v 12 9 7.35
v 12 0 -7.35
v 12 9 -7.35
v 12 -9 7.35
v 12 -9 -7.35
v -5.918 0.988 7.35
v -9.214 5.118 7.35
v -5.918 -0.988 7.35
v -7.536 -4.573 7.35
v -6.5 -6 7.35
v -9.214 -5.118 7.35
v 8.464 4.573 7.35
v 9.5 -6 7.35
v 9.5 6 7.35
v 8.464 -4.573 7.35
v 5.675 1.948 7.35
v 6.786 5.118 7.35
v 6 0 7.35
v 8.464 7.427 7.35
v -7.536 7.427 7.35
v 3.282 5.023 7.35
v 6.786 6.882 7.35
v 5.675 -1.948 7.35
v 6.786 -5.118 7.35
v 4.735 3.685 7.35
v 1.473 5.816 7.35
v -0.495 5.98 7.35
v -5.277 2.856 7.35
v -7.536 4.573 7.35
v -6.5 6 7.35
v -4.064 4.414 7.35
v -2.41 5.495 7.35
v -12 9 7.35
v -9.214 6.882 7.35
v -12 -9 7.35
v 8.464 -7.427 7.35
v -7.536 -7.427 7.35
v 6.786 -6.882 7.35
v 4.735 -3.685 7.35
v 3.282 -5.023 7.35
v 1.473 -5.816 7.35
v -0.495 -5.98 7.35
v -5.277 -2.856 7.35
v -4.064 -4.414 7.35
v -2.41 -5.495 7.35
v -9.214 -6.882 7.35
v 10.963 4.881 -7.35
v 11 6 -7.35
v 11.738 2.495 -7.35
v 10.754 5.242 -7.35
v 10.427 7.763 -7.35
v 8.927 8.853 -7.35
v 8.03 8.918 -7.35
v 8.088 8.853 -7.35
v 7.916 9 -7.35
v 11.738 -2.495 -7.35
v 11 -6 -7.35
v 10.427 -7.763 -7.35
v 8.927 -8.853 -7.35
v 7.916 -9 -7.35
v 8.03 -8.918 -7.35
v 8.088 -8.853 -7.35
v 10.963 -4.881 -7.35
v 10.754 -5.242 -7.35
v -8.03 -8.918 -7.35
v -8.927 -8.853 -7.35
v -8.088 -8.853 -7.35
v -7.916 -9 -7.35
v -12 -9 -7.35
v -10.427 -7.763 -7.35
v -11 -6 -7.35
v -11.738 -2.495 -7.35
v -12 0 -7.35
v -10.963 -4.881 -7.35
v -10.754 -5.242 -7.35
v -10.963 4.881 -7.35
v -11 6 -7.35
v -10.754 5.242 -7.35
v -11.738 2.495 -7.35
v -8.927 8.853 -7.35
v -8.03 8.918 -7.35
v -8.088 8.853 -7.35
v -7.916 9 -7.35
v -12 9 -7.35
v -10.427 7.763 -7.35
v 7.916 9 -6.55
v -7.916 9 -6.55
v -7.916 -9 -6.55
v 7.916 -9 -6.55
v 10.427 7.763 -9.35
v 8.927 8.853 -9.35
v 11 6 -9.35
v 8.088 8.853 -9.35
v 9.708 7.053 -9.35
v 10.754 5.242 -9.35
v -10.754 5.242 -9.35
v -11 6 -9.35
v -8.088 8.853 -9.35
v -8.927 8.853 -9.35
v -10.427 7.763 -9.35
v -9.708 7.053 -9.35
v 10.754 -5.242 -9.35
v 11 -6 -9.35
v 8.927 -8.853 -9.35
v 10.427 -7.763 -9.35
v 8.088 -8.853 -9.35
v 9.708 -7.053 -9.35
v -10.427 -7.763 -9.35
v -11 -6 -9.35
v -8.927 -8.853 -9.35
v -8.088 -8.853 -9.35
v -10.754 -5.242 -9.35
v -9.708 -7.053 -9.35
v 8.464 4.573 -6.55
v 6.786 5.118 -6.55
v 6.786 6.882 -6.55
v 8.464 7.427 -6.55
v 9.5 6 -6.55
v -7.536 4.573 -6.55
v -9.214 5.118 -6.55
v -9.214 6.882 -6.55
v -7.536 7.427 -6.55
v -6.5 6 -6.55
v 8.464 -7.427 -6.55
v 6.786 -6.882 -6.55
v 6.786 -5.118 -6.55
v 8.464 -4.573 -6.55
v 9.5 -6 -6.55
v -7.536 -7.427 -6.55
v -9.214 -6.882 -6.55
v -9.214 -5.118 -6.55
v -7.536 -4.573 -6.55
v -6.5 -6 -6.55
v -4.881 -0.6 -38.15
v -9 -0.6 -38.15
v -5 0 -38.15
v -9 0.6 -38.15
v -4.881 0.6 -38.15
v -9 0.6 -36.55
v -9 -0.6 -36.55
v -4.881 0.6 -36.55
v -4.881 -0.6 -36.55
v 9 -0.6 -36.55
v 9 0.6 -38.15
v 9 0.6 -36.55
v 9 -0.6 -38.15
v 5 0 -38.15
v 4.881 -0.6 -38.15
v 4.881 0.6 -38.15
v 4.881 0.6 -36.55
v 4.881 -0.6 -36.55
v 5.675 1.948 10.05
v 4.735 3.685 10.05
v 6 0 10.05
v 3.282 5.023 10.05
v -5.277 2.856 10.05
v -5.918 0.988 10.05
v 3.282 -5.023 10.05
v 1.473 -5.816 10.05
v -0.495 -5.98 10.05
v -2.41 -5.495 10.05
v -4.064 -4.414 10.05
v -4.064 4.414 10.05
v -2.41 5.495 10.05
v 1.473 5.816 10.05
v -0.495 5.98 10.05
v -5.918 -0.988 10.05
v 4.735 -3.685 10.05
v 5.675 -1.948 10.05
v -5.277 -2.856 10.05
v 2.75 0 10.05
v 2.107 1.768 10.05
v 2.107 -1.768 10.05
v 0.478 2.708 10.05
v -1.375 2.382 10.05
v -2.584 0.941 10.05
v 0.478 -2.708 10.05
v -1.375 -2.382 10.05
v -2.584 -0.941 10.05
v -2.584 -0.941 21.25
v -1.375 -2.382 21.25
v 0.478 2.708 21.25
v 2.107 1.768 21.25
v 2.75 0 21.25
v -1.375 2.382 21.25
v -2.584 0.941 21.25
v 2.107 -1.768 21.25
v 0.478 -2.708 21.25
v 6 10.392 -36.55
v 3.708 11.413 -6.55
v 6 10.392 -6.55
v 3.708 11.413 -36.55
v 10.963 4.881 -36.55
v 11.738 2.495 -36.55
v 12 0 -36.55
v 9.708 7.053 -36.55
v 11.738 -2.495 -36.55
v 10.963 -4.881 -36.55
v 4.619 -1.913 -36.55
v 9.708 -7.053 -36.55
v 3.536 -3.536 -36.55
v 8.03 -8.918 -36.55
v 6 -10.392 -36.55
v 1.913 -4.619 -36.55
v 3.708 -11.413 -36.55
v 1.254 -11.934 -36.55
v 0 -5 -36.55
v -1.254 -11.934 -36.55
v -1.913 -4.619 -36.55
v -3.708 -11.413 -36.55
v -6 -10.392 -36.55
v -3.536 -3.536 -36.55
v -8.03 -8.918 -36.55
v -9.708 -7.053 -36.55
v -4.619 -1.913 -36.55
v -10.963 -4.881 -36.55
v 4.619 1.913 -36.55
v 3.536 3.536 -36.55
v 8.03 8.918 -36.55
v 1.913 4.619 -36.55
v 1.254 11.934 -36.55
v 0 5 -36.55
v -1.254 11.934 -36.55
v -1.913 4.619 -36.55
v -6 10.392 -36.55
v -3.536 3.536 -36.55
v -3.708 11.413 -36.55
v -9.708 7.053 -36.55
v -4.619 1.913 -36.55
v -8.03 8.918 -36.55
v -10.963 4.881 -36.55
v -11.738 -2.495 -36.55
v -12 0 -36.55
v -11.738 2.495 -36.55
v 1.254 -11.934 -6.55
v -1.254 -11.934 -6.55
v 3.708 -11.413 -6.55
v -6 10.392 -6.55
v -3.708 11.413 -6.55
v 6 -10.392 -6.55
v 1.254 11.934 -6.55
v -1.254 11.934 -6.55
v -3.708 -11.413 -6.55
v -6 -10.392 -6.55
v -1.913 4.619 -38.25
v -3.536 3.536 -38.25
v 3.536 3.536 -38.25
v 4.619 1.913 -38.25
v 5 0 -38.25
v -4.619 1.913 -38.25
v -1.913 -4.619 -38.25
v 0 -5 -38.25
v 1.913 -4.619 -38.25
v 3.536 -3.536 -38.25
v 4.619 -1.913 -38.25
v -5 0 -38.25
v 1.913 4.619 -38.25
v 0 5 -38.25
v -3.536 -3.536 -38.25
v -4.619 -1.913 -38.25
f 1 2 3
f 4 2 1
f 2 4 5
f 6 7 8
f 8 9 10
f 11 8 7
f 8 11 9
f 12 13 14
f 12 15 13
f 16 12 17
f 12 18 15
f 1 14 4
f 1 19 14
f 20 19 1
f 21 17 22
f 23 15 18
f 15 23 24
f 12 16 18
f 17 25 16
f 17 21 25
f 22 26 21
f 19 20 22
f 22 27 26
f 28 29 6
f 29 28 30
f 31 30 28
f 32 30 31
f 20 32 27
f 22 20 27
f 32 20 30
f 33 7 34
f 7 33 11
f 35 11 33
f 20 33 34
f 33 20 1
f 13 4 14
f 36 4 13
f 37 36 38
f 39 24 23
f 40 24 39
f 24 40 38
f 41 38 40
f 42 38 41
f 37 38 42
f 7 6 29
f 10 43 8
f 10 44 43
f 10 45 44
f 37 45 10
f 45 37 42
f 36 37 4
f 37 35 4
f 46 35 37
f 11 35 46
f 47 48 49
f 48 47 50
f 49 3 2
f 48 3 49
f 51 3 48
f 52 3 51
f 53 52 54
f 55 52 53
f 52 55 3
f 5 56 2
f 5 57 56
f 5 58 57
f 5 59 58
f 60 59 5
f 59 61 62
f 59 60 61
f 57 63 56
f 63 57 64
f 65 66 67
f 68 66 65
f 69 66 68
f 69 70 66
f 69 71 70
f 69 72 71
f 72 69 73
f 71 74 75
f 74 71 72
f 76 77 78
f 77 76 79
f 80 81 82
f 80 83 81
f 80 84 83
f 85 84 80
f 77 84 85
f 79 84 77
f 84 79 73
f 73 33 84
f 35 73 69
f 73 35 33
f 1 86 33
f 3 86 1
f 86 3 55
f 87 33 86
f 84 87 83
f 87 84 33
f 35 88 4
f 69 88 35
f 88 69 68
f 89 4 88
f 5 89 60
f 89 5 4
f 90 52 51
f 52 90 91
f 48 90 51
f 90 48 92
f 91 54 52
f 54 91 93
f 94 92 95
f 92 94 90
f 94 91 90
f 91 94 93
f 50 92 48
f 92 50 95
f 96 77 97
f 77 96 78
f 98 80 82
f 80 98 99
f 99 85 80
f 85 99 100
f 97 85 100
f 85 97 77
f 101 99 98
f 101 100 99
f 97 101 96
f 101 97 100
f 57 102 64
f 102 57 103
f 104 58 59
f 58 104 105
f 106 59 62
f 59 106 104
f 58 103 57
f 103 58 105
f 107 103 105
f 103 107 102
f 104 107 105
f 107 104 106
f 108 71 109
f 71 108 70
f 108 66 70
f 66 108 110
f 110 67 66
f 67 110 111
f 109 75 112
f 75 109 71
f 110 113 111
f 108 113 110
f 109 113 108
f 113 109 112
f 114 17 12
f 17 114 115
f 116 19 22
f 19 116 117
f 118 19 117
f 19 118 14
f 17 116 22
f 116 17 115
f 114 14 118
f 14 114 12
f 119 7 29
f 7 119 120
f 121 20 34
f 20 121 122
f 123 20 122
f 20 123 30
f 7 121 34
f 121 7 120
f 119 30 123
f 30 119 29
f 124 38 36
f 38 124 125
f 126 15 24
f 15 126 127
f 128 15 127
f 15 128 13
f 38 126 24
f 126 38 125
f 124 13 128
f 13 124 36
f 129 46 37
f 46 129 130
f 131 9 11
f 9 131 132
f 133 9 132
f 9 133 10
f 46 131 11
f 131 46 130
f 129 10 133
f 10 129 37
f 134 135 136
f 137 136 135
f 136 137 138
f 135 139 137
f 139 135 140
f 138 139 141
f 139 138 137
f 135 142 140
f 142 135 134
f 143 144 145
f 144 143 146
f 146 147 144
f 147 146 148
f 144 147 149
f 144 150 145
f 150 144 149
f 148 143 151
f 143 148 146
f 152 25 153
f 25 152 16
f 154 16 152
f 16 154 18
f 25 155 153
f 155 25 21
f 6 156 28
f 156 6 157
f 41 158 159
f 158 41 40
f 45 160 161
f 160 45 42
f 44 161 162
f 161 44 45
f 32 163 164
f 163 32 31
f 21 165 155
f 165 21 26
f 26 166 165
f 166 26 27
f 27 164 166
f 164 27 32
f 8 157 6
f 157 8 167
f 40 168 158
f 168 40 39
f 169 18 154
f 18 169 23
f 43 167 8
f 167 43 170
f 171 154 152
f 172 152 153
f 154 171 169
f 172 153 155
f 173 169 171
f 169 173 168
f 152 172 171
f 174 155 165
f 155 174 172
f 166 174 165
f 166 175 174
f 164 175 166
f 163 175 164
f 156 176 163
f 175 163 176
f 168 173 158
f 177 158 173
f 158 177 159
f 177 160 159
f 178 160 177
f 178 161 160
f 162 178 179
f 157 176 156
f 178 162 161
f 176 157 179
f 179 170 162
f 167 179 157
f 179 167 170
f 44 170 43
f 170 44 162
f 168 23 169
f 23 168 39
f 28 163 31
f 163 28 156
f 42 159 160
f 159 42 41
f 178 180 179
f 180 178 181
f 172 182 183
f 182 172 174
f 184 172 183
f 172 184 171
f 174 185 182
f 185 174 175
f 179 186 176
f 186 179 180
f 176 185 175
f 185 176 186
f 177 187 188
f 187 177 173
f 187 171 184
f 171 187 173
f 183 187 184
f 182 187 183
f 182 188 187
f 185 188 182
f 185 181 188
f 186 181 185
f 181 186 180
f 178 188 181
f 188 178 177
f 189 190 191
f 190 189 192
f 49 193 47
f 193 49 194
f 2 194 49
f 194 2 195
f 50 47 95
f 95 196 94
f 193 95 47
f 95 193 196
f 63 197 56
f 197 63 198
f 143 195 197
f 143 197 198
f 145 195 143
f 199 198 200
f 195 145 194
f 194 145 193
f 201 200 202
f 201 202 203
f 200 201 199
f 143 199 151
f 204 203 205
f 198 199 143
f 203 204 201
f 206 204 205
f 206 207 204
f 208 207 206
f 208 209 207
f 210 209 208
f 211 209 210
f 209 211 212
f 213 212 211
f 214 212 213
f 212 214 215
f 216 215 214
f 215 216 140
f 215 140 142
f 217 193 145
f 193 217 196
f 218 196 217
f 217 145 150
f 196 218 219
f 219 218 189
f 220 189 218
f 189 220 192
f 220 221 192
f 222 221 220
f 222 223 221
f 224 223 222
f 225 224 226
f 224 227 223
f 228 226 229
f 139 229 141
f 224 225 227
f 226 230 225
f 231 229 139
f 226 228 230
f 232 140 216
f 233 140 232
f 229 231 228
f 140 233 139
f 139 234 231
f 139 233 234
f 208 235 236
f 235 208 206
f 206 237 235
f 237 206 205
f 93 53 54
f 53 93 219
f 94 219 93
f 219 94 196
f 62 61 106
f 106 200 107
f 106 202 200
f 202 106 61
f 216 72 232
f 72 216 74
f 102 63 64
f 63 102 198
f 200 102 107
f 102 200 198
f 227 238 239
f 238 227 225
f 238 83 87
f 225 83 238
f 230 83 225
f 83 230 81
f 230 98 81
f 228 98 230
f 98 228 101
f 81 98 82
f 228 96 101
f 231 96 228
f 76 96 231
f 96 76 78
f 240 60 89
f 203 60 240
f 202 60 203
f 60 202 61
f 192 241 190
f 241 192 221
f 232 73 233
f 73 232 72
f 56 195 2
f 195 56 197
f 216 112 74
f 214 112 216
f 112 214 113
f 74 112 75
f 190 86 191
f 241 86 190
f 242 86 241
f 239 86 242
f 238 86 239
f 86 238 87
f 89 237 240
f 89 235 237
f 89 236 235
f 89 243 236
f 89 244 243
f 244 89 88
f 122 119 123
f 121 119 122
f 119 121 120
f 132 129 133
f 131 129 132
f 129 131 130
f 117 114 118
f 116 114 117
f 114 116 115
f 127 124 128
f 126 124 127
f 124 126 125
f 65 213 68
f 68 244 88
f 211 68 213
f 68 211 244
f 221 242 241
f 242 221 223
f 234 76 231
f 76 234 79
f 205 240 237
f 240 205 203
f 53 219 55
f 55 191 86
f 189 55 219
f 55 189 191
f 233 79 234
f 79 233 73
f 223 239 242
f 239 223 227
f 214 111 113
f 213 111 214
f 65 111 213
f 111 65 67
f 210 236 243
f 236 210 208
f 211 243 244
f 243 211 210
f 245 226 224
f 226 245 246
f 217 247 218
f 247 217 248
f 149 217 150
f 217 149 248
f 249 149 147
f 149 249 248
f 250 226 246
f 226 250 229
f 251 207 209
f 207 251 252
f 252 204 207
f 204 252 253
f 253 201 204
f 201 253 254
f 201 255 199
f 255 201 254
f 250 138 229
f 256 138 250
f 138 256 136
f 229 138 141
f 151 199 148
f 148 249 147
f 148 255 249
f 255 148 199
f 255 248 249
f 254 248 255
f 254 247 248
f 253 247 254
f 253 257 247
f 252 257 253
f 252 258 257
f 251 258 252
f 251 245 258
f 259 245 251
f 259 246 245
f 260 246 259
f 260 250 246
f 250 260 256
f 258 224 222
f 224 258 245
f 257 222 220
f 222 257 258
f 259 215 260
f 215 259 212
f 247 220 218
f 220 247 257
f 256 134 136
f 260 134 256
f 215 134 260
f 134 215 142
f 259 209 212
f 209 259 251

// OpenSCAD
// Parameters
type_v0 = 6; //[3:12:0.1]
type_v1 = 5.5; //[2.75:11:0.1]
type_v2 = 14.7; //[7.35:29.4:0.1]
type_v3 = 12; //[6:24:0.1]
alpha = 1; //[0.1:1:0.05]
eps = 0.8; //[0.5:2:0.1]
gearbox_w = 24; //[12:48:0.5]
gearbox_d = 18; //[9:36:0.5]
gearbox_h = 14.7; //[7.35:29.4:0.1]
boss_d = 12; //[6:24:0.5]
boss_h = 3.5; //[1.75:7:0.1]
shaft_d = 5.5; //[2.75:11:0.1]
shaft_len = 12; //[6:24:0.5]
motor_d = 24; //[12:48:0.5]
motor_len = 30; //[15:60:0.5]
hub_d = 10; //[5:20:0.5]
hub_h = 2.5; //[1.25:5:0.1]
screw_hole_d = 3; //[1.5:6:0.1]
screw_boss_d = 6; //[3:12:0.1]
screw_boss_extra_h = 2; //[1:6:0.1]
screw_spacing_x = 16; //[8:32:0.5]
screw_spacing_y = 12; //[6:24:0.5]
tag_w = 6; //[3:12:0.5]
tag_h = 10; //[5:20:0.5]
tag_t = 1.2; //[0.6:2.4:0.1]
tag_offset_x = 12; //[6:24:0.5]

// Gear Motor - complete geometry
module gear_motor() {
  color("DimGray") {
    // Gearbox housing with bosses
    difference() {
      union() {
        translate([0, 0, 0])
          cube([gearbox_w, gearbox_d, gearbox_h], center=true);
        translate([screw_spacing_x/2, screw_spacing_y/2, -screw_boss_extra_h/2])
          cylinder(r=screw_boss_d/2, h=gearbox_h + screw_boss_extra_h, center=true);
        translate([-screw_spacing_x/2, screw_spacing_y/2, -screw_boss_extra_h/2])
          cylinder(r=screw_boss_d/2, h=gearbox_h + screw_boss_extra_h, center=true);
        translate([screw_spacing_x/2, -screw_spacing_y/2, -screw_boss_extra_h/2])
          cylinder(r=screw_boss_d/2, h=gearbox_h + screw_boss_extra_h, center=true);
        translate([-screw_spacing_x/2, -screw_spacing_y/2, -screw_boss_extra_h/2])
          cylinder(r=screw_boss_d/2, h=gearbox_h + screw_boss_extra_h, center=true);
      }
      translate([screw_spacing_x/2, screw_spacing_y/2, -screw_boss_extra_h/2])
        cylinder(r=screw_hole_d/2, h=gearbox_h + screw_boss_extra_h + 2*eps, center=true);
      translate([-screw_spacing_x/2, screw_spacing_y/2, -screw_boss_extra_h/2])
        cylinder(r=screw_hole_d/2, h=gearbox_h + screw_boss_extra_h + 2*eps, center=true);
      translate([screw_spacing_x/2, -screw_spacing_y/2, -screw_boss_extra_h/2])
        cylinder(r=screw_hole_d/2, h=gearbox_h + screw_boss_extra_h + 2*eps, center=true);
      translate([-screw_spacing_x/2, -screw_spacing_y/2, -screw_boss_extra_h/2])
        cylinder(r=screw_hole_d/2, h=gearbox_h + screw_boss_extra_h + 2*eps, center=true);
    }
    
    // Shaft boss
    translate([0, 0, gearbox_h/2 + boss_h/2 - eps])
      cylinder(r=boss_d/2, h=boss_h, center=true);
    
    // Output shaft
    color("Silver") translate([0, 0, gearbox_h/2 + boss_h + shaft_len/2 - 2*eps])
      cylinder(r=shaft_d/2, h=shaft_len, center=true);
    
    // Motor can
    color("Black") translate([0, 0, -gearbox_h/2 - motor_len/2 + eps])
      cylinder(r=motor_d/2, h=motor_len, center=true);
    
    // Motor hub
    translate([0, 0, -gearbox_h/2 - motor_len - hub_h/2 + 2*eps])
      cylinder(r=hub_d/2, h=hub_h, center=true);
    
    // Electrical tags
    color("Silver") {
      translate([-tag_offset_x/2, 0, -gearbox_h/2 - motor_len + tag_h/2 - eps])
        cube([tag_w, tag_t, tag_h], center=true);
      translate([tag_offset_x/2, 0, -gearbox_h/2 - motor_len + tag_h/2 - eps])
        cube([tag_w, tag_t, tag_h], center=true);
    }
  }
}

// Assembly
module assembly() {
  gear_motor();
}

assembly();
